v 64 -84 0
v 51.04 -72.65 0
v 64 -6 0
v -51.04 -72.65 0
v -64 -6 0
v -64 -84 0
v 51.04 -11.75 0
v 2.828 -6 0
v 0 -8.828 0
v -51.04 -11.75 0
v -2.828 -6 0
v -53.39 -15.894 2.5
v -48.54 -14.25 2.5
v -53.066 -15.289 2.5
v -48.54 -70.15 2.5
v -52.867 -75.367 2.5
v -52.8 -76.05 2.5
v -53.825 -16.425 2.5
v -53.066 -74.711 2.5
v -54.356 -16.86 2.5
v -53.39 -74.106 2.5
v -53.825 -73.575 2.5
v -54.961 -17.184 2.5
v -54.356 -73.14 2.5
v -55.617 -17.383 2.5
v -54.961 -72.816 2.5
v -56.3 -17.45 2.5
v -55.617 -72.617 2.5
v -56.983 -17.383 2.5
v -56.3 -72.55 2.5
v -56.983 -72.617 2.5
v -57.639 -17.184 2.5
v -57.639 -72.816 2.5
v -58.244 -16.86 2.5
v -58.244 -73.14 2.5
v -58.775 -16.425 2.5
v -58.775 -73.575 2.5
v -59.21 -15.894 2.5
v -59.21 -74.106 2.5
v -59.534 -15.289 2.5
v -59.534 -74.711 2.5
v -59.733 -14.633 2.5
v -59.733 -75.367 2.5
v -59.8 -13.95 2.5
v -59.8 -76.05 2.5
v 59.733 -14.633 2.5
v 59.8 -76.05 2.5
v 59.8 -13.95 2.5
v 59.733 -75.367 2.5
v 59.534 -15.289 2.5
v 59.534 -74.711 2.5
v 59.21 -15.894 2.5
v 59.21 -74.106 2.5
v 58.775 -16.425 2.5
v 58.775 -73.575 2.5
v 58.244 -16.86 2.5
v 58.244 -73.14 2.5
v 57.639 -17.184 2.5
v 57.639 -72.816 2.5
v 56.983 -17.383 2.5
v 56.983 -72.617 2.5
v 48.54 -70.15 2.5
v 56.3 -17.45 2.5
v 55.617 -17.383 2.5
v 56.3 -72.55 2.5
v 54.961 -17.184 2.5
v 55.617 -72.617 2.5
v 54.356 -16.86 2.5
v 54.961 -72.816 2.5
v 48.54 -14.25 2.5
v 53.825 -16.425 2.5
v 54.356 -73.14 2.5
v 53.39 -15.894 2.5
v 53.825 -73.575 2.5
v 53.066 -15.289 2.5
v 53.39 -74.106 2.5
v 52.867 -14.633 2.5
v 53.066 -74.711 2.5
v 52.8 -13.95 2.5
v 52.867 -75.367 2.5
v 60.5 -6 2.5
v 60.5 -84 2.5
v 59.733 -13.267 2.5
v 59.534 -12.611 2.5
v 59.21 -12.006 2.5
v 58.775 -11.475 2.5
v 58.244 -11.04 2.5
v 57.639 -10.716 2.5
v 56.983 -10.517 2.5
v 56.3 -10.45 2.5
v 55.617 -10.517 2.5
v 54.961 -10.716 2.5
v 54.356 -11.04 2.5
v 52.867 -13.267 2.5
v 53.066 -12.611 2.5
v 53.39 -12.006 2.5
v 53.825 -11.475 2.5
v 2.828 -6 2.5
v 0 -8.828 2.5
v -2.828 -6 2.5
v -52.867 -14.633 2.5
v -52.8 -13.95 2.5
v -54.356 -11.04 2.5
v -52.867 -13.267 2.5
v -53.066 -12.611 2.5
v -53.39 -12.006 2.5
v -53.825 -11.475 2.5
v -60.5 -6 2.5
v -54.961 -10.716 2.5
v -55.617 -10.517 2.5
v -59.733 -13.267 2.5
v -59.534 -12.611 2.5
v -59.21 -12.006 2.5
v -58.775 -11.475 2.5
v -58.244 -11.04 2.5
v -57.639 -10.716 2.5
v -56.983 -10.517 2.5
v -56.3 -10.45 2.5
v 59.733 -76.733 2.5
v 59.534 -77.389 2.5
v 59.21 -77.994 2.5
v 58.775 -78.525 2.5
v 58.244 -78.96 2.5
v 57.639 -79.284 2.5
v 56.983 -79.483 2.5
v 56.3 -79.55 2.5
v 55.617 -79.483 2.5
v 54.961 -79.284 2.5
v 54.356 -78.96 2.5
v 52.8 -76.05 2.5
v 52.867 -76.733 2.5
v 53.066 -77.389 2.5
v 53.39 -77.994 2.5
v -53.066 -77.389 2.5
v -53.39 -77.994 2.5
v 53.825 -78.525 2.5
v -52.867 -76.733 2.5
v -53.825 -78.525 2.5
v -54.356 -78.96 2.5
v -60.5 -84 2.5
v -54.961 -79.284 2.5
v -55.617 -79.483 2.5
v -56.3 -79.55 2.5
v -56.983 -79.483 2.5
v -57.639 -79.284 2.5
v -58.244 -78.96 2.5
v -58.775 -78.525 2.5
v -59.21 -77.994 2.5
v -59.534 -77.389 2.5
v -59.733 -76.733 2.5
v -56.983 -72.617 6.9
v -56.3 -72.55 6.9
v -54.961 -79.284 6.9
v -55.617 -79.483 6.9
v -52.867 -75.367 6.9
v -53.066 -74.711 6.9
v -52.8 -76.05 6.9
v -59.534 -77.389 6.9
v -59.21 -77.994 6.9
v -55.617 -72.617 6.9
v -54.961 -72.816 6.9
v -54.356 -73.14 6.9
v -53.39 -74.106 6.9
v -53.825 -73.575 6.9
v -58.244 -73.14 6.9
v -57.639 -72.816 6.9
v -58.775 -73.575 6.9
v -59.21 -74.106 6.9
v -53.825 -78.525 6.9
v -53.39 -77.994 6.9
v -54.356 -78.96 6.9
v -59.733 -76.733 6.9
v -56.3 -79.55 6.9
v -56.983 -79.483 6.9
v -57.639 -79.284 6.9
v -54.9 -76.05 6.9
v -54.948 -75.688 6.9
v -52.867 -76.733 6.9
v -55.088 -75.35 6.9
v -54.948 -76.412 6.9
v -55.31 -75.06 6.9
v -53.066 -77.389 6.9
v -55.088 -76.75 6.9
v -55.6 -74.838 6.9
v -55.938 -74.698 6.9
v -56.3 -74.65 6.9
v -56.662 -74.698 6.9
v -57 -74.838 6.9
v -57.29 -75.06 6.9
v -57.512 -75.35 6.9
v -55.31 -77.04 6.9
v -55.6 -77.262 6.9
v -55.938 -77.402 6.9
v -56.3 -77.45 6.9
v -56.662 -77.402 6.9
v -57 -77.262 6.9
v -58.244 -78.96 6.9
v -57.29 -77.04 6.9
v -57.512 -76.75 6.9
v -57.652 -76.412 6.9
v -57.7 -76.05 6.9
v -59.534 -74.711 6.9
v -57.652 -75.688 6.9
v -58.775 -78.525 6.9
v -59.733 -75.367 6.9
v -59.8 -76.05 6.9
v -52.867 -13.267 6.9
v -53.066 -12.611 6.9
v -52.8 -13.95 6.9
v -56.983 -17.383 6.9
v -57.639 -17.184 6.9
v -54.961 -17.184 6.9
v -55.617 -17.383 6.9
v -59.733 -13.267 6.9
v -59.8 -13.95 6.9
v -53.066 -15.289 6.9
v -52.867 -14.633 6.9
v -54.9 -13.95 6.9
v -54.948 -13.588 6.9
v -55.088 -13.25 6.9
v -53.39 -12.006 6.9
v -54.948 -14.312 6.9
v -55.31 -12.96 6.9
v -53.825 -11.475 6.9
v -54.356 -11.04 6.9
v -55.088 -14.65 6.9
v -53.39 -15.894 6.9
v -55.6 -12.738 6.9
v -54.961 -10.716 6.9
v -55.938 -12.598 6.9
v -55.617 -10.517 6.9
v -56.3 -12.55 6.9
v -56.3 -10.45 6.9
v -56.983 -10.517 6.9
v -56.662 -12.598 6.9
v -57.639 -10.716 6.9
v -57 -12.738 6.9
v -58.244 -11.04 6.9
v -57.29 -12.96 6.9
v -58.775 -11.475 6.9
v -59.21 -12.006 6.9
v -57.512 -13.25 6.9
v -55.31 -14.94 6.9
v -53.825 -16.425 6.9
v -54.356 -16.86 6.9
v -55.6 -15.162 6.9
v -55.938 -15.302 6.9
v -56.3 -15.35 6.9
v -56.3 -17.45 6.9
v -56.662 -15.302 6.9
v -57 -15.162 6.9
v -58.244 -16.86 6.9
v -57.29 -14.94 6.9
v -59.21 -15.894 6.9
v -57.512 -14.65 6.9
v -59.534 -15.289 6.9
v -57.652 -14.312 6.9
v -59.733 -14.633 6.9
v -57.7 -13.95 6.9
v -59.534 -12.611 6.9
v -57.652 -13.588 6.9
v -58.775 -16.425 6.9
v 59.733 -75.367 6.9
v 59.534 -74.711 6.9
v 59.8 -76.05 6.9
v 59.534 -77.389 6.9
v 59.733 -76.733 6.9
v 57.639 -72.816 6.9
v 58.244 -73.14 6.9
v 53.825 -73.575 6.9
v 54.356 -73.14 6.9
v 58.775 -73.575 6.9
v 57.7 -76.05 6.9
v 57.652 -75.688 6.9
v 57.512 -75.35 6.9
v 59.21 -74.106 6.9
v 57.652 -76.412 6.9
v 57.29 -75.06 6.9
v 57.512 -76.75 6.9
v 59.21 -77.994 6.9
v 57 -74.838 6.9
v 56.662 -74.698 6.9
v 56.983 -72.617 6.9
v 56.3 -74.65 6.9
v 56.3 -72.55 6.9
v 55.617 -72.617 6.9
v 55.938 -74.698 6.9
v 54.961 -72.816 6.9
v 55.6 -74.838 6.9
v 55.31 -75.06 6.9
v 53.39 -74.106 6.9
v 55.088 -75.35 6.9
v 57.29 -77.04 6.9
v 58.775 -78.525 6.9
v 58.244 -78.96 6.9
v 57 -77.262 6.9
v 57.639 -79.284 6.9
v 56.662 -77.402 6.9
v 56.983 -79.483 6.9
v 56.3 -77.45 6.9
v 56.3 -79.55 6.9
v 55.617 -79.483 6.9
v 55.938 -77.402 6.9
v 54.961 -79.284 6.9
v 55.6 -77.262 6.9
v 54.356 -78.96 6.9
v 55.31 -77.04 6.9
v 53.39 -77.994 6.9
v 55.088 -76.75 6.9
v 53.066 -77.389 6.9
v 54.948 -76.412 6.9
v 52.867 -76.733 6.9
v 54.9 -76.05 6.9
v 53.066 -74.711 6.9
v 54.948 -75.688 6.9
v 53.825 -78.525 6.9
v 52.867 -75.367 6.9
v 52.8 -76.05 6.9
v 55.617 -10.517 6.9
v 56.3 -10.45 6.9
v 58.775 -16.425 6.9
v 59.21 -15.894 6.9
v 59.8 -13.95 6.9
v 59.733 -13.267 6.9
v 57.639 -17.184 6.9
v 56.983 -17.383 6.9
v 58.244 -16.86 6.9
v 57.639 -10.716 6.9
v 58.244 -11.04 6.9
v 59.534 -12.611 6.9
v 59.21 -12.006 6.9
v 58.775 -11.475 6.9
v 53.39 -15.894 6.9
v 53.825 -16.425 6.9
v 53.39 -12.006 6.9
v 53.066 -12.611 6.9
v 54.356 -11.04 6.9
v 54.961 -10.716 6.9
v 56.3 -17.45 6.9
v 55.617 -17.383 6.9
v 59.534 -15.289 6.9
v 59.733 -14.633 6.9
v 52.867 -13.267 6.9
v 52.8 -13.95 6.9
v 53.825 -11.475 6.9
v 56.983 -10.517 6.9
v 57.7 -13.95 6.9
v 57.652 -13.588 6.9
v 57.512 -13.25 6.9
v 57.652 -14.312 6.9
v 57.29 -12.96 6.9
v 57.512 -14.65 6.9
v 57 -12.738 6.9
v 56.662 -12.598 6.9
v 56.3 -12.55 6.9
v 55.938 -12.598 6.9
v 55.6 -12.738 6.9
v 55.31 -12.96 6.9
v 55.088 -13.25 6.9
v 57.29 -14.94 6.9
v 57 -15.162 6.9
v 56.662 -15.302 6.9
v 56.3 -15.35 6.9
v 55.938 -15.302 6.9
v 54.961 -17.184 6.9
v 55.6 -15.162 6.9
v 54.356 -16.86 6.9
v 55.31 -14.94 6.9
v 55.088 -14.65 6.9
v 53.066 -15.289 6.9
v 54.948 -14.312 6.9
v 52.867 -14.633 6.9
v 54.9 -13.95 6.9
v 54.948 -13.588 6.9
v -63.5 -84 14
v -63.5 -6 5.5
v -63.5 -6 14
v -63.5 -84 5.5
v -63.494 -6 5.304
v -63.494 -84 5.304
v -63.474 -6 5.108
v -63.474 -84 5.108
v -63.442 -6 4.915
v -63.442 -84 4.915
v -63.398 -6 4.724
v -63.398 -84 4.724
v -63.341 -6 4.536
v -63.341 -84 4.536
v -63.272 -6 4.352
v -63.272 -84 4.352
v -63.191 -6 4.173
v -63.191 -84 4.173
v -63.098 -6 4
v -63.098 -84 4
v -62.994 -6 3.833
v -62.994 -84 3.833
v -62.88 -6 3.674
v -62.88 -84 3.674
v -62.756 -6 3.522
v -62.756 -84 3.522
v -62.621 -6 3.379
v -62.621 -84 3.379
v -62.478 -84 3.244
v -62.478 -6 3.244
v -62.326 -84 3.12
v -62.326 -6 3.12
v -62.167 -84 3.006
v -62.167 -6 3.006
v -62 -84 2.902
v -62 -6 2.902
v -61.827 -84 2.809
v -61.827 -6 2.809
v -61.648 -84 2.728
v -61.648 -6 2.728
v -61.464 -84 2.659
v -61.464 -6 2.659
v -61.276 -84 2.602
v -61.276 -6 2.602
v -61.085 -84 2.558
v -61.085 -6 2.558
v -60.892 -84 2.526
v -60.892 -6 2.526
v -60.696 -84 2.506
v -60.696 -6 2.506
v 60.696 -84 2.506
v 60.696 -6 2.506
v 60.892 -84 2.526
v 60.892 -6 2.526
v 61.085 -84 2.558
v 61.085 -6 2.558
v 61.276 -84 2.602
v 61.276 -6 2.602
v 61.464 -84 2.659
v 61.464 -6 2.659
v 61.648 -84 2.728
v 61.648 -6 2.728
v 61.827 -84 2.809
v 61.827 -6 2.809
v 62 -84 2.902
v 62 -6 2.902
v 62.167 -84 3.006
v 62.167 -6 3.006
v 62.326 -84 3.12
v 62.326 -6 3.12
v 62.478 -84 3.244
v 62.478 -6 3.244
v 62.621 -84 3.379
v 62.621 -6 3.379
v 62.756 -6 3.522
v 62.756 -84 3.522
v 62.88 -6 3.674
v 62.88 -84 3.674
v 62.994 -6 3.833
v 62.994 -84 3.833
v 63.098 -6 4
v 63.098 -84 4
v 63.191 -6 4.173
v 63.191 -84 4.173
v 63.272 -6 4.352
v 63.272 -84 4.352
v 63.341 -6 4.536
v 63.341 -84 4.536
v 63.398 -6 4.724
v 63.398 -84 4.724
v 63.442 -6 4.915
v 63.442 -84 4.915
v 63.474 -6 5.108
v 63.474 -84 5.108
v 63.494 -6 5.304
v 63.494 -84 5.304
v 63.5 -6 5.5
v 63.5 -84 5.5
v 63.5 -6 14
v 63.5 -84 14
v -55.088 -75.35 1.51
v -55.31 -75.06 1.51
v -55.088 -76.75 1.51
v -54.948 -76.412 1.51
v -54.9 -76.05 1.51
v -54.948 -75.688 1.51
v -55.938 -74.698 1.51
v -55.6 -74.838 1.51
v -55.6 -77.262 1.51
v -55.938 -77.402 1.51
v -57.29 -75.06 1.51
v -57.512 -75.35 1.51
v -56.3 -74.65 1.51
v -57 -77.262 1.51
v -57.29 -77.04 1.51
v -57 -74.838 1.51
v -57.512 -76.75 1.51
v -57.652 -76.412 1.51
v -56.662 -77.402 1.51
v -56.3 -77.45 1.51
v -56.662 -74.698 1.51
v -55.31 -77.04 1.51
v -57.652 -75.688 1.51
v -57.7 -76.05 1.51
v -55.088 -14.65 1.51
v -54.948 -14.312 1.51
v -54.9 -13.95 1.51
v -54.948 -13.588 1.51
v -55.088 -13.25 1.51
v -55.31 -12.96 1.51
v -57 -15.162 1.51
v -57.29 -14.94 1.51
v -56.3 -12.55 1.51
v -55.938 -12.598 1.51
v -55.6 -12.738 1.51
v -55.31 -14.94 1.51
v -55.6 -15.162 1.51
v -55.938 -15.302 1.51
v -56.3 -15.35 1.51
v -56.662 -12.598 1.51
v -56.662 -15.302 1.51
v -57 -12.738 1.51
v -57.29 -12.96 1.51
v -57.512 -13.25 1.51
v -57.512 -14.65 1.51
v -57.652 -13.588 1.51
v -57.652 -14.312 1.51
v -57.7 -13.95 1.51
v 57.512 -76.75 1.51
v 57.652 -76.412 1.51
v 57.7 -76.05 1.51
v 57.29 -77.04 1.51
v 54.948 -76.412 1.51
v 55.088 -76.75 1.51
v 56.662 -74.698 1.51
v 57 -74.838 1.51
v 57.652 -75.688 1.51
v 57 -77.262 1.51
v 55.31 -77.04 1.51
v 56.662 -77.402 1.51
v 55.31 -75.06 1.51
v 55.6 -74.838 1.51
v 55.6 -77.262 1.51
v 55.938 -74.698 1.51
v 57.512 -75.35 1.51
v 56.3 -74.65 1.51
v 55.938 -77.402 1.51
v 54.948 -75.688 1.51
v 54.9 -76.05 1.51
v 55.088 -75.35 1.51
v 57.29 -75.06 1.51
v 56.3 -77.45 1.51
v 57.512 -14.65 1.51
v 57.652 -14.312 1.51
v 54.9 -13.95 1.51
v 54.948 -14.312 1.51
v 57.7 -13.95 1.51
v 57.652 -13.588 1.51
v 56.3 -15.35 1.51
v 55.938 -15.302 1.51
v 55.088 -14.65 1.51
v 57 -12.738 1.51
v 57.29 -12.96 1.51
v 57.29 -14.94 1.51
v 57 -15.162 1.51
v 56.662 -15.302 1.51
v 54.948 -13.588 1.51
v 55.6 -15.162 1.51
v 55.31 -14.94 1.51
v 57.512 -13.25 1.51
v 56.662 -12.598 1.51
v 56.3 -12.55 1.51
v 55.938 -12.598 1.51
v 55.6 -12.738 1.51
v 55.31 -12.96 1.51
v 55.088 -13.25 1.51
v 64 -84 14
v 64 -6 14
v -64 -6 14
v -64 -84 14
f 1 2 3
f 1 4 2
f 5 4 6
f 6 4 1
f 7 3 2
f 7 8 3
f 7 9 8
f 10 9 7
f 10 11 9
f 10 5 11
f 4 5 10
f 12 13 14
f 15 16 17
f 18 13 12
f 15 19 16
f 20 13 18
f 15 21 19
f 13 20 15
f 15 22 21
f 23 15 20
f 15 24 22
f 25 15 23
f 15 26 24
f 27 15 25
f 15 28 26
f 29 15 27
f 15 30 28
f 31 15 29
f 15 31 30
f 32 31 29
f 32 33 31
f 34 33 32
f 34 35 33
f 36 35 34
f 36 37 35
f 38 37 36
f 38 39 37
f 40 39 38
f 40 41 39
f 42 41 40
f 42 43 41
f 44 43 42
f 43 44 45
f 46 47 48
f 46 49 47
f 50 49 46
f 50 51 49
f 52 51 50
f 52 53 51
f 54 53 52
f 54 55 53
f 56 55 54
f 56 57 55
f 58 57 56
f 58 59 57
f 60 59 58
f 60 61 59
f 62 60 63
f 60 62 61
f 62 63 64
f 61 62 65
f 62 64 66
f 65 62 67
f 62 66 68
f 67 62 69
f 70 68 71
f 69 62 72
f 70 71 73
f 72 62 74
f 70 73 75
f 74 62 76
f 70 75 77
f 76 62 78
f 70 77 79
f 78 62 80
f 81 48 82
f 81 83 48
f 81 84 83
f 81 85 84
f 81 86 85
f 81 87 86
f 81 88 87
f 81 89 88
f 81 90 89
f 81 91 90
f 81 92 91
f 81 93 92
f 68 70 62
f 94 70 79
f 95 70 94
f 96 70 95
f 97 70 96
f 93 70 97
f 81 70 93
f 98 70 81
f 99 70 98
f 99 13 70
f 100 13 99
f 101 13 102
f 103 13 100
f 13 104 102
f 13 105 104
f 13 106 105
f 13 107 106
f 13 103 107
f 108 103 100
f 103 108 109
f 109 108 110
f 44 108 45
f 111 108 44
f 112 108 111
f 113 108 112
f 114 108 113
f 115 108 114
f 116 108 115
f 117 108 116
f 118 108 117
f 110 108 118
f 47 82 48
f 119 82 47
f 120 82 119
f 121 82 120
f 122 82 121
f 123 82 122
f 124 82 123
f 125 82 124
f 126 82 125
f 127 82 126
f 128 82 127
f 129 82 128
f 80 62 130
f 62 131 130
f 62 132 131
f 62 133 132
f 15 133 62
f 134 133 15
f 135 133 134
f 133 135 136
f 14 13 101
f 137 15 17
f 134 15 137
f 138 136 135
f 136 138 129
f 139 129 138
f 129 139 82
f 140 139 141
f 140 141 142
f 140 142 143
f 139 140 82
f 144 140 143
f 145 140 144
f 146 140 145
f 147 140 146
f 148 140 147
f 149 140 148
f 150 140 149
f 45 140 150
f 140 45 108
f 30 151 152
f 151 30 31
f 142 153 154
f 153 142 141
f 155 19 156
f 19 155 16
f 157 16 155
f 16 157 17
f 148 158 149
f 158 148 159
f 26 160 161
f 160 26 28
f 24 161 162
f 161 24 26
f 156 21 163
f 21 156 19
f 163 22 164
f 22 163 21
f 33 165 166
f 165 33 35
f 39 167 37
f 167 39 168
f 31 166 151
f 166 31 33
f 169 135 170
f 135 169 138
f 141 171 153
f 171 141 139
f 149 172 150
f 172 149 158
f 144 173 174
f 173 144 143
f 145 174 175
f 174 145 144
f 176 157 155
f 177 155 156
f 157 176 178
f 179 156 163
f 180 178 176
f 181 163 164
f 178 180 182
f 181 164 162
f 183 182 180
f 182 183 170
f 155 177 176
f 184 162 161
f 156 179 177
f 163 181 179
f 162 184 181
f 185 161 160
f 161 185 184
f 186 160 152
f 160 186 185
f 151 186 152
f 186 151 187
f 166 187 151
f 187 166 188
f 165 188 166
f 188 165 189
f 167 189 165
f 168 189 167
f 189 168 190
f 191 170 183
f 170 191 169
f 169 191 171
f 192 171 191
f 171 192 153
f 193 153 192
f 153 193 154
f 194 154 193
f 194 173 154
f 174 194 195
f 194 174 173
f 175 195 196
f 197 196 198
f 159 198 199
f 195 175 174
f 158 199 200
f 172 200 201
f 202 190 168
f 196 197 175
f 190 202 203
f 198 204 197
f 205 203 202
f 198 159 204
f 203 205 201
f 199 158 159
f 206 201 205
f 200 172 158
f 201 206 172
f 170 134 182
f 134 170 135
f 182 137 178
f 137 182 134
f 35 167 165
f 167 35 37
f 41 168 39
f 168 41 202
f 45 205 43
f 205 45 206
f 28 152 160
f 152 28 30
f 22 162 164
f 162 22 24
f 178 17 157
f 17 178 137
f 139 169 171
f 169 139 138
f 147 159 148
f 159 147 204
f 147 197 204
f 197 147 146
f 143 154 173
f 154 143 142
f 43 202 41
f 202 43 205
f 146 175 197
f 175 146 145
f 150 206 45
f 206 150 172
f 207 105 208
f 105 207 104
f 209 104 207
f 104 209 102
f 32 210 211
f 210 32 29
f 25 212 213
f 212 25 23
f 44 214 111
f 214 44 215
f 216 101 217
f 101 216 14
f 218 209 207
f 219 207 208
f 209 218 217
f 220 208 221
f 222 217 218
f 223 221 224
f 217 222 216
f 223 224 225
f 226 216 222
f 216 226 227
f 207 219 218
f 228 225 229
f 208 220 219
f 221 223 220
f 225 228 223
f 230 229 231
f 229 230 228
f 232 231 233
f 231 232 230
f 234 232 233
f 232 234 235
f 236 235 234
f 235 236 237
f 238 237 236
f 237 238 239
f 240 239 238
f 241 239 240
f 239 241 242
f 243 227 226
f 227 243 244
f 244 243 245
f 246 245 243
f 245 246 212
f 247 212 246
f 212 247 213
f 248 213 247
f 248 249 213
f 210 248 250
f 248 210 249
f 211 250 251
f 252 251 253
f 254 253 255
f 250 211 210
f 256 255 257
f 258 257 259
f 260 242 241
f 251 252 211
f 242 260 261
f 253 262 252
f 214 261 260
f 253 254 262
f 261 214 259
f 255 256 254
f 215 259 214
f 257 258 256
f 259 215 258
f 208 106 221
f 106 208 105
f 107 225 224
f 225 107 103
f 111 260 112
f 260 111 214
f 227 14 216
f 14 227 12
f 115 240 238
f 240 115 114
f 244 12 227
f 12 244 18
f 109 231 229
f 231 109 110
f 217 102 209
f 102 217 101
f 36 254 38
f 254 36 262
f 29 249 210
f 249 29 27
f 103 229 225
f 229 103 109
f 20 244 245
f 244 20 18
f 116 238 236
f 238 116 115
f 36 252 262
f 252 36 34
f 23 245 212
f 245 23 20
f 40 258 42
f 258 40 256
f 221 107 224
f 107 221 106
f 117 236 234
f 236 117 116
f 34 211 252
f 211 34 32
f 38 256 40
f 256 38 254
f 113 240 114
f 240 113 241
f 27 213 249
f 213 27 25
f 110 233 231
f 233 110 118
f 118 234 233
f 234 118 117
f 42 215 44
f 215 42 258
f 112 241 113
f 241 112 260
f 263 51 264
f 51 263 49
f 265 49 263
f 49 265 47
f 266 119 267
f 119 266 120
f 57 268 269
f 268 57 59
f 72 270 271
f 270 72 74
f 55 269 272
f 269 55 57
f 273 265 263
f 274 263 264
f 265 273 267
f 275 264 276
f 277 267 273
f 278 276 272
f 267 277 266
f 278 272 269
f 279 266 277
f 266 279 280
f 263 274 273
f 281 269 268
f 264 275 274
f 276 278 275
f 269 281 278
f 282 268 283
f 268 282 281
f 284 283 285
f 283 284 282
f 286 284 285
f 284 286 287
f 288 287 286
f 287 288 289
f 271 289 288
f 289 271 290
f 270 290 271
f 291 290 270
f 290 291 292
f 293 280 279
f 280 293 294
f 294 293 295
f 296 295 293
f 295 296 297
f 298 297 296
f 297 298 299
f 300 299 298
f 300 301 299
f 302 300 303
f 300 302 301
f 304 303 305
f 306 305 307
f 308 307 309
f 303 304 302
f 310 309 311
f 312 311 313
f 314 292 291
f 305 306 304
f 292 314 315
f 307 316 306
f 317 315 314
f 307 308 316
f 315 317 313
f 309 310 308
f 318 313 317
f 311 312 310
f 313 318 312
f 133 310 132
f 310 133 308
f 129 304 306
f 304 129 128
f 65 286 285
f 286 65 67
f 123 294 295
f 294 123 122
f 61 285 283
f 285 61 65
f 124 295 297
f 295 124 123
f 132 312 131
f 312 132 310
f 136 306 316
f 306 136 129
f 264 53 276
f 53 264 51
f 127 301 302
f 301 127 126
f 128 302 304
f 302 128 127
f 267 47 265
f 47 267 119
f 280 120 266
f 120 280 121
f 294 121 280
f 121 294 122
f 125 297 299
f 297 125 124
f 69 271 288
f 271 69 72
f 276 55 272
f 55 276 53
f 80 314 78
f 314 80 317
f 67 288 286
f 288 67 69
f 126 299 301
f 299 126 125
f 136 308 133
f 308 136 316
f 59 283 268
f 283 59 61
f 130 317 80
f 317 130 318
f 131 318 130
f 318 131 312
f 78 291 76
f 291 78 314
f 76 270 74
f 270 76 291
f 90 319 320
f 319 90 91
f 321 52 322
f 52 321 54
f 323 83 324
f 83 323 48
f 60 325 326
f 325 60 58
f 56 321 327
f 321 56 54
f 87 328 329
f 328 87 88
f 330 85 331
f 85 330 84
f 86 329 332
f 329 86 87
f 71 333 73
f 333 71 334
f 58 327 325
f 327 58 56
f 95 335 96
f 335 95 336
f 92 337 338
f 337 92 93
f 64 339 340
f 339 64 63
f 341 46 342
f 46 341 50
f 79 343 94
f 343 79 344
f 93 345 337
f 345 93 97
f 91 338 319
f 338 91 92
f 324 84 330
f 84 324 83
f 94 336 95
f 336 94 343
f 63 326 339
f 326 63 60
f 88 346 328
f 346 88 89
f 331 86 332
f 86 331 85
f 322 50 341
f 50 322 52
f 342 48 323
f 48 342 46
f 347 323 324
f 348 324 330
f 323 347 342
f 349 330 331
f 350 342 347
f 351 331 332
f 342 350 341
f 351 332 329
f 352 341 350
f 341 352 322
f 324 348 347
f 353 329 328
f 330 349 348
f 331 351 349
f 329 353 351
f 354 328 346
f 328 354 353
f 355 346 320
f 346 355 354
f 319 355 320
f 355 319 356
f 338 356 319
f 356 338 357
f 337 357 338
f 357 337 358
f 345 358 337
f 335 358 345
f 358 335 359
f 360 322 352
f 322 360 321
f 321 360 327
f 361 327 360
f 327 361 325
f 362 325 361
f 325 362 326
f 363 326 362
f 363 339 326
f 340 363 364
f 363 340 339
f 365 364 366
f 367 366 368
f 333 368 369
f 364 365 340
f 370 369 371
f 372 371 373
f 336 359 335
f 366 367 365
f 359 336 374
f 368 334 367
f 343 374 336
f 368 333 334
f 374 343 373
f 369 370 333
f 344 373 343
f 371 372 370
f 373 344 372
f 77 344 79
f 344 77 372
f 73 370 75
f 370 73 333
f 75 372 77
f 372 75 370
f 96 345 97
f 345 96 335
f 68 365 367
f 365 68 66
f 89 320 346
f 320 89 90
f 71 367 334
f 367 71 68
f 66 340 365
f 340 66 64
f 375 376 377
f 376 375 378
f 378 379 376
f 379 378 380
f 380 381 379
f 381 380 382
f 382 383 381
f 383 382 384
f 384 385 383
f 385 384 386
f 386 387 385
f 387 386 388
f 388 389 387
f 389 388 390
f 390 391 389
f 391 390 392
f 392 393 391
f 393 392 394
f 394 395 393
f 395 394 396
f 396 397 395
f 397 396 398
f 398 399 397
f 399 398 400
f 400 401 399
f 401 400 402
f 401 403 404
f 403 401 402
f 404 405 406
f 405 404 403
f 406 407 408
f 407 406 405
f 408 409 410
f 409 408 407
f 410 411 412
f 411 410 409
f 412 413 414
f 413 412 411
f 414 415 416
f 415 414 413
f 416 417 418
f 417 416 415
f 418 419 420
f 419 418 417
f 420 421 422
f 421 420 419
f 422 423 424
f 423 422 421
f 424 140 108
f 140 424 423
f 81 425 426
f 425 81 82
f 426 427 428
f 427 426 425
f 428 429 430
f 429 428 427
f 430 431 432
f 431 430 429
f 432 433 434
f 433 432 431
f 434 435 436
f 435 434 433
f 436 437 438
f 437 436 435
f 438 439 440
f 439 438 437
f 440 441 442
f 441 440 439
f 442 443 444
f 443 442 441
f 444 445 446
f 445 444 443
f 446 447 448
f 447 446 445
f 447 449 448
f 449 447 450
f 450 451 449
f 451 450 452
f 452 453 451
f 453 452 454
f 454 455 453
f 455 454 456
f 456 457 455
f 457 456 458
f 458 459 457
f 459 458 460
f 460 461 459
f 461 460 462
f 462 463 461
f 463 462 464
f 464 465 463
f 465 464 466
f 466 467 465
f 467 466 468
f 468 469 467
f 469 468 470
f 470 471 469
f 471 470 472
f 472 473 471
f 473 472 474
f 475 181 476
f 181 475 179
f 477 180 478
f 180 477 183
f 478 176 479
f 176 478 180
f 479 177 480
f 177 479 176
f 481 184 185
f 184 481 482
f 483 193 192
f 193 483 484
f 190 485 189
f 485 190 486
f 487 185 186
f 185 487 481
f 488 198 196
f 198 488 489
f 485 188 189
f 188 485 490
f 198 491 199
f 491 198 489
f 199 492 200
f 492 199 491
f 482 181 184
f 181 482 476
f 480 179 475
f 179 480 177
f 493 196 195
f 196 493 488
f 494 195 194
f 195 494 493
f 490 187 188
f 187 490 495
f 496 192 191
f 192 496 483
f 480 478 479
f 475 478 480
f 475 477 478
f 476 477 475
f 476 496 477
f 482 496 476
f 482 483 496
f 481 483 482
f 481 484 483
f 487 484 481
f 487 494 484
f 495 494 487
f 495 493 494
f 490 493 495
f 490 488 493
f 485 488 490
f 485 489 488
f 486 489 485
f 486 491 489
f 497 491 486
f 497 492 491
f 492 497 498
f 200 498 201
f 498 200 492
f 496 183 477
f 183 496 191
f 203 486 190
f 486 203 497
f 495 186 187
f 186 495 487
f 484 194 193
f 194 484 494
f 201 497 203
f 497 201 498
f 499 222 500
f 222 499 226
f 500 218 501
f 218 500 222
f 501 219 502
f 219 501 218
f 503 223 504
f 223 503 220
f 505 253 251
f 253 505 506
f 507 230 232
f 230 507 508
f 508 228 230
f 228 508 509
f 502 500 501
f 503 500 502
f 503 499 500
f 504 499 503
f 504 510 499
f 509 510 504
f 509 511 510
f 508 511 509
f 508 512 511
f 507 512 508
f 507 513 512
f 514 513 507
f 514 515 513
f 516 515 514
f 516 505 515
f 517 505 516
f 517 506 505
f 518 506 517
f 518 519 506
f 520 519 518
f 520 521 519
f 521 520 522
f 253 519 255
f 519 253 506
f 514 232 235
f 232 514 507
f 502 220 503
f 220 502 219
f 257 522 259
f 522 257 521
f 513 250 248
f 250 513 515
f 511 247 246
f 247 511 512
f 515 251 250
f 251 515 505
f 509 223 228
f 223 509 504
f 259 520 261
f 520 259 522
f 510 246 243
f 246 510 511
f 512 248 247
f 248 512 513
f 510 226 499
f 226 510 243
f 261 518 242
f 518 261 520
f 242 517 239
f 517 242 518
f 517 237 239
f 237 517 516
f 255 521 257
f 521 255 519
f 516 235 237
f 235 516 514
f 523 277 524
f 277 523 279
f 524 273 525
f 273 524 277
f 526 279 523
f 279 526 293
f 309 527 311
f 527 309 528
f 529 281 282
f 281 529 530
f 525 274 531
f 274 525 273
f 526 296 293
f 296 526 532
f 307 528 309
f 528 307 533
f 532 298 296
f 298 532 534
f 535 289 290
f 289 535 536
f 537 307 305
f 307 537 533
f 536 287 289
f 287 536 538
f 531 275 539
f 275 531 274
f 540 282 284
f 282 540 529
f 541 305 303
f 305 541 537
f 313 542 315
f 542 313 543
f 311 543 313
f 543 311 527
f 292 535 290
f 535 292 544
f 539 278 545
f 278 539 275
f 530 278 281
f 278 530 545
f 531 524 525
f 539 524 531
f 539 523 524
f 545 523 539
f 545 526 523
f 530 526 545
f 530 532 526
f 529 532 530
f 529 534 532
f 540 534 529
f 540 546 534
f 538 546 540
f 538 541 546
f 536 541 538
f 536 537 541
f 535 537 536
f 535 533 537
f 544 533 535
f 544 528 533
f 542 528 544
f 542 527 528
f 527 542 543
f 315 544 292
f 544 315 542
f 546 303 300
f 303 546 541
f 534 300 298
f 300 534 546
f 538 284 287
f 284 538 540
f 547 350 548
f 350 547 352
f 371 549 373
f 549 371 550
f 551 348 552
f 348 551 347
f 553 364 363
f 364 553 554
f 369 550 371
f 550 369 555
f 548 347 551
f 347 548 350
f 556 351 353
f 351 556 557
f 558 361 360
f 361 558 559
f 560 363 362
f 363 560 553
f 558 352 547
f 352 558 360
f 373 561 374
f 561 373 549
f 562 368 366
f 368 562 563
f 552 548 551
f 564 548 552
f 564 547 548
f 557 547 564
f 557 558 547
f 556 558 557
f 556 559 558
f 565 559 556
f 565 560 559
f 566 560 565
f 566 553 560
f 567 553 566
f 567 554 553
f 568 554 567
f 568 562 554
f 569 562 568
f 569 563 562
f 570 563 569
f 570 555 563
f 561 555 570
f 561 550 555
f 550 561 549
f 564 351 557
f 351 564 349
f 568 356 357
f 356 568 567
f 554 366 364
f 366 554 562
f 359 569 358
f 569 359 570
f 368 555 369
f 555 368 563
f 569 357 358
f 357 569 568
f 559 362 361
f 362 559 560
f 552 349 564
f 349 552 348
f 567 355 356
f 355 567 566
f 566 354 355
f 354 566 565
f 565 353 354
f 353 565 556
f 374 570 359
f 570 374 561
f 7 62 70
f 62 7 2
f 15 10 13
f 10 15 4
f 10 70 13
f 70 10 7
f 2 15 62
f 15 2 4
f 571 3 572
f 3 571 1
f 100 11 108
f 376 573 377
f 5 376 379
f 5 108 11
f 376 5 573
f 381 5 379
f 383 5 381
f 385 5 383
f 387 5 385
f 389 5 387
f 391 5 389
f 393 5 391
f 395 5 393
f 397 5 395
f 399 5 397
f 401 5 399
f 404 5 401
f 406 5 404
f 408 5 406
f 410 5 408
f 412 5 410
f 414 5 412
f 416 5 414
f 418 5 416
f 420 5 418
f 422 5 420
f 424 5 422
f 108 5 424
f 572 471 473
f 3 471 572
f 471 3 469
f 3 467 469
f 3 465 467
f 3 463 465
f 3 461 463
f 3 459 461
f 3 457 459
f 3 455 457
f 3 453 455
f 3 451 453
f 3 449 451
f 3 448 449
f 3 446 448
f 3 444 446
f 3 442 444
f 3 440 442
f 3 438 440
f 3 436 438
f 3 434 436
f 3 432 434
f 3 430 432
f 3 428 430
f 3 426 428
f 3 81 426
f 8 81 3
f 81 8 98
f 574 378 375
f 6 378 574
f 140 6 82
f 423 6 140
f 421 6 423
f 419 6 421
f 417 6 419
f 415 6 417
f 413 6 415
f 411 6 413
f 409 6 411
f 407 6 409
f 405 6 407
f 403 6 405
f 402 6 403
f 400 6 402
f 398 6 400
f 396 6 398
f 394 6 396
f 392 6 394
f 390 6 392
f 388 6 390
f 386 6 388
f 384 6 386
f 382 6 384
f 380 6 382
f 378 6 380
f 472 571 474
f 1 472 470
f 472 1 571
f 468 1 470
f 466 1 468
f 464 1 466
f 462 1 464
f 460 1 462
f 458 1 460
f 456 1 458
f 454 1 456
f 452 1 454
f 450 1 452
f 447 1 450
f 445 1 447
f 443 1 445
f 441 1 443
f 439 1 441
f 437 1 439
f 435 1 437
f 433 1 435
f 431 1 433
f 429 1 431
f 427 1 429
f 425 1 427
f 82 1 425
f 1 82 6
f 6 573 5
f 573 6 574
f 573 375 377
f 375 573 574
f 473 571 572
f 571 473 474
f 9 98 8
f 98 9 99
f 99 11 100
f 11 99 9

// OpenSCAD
// file: ../../level2.scad
// Level 2 - shared dimensions for the drive deck, motor bracket, body and skirt.
// Frame: origin at the centre of the deck's TOP surface; +Z up, +Y = front (display), +X = right.
// The lazy Susan sits on the deck's plinth; the turntable pulley hangs through the deck's hole.
include <params.scad>

// ---- outline -------------------------------------------------------------------------------
l2_size   = [160, 160];     // footprint (rounded square), same for body and skirt
l2_r      = 14;             // corner radius
l2_h      = 90;             // body height (floor to the deck's underside... see body)
l2_wall   = 2.5;            // body walls

// ---- the reComputer under Level 2, and the skirt round it (skirt.scad) -------------------------
jetson    = [130.1, 121.1, 51];     // reComputer J4012, MEASURED (x, y, height) with its case top OFF;
                                    //   ports at the back, fan near the middle (~1 cm toward the front)
jetson_top = 7.1;                   // the case top, if fitted: 58.1 with it, MEASURED
air_gap   = 10;                     // over the case top when it's on (17 over the open board): the fan
                                    //   draws in from here
skirt_h   = jetson[2] + jetson_top + air_gap;   // 68.1: desk -> Level 2's floor
// body <-> skirt screws (M3 down through the body floor into inserts in the skirt): along the
// sides, outside the reComputer (x +/-65)
skirt_pts = [[-71, -45], [-71, 45], [71, -45], [71, 5]];   // clear of the buck (left),
                                    //   the perfboard (right front) and the motor (right back)

// ---- deck ----------------------------------------------------------------------------------
deck_t    = 4;              // deck plate: z = -deck_t .. 0
deck_hole = 112;            // reach the inner ring's bolts from below during assembly

// ---- lazy Susan + turntable pulley (turntable_pulley.scad) --------------------------------
z_ls      = plinth_h;                    // lazy Susan's underside (on the plinth): 2
z_plate   = z_ls + ls_h;                 // turntable plate's underside = inner ring top: 12.5
belt_drop = 24.5;                        // plate underside -> belt centre (turntable_pulley)
z_belt    = z_plate - belt_drop;         // -12: belt centre, below the deck top
pulley_R  = 100 * 2 / PI / 2;            // 31.83: ring pulley pitch radius (100 T)
pulley_bottom = z_belt - 3.2 - 1.6 - 2.2;  // -19: lowest point of the hanging pulley
clamp_r   = 35.5;                        // pulley's belt clamp block (its widest part)

// ---- motor ----------------------------------------------------------------------------------
motor_a   = -45;            // direction of the motor from the centre: back-right corner
motor_C   = 46;             // nominal centre distance; the bracket slides +/- tension_travel (42..50:
                            //   at 41 the motor pulley would touch the ring pulley's flange)
tension_travel = 4;
nema      = [42.3, 33.4];   // NEMA17 (MEASURED body length; not a pancake): square, body length
nema_shaft = 17.5;          // MEASURED shaft length above the face
nema_holes = 31;            // M3 screw spacing on its face
nema_boss = 22;             // centring boss on its face (dia), ~2 tall
mp_T      = 20;             // motor pulley teeth
mp_belt_c = 13 + 7.1 / 2;   // MEASURED: pulley pushed fully down on the motor, its toothed section
                            //   (7.1 wide; the belt is a standard 6 mm) runs 13..20.1 above the face
bracket_t = 3;              // motor plate thickness; the pulley passes down through its centre hole
bracket_drop = 3;           // the motor hangs this much LOWER than "pulley pushed fully down" needs:
                            //   on the first build the ring pulley sat ~2 mm below the motor pulley,
                            //   so the motor pulley now starts ~1 mm low and is raised on the shaft
                            //   to line the belt up (a few mm of adjustment either way)
z_motor_face  = z_belt - mp_belt_c - bracket_drop;   // -31.55
z_bracket_top = z_motor_face + bracket_t;    // -28.55
z_motor_bottom = z_motor_face - nema[1];     // -64.95
z_mp_top  = z_motor_face + bracket_drop + 13 + 7.1 + 1;   // ~-7.45 (pulley raised to the belt; EST top flange ~1 mm)
// main file
// Display fit test: just the front wall of the Level 2 body round the 4.3" display - the window
// (raised 2.8 mm above the board's centre, chamfered) and the four posts with M3 inserts - cut
// straight from l2_body.scad, so it is exactly what the body will have. (~30 min)
// The notch marks the TOP edge. Check: screw the JC4827W543 on (image upright) (M3 x 6-8 into heat-set inserts); the image should fill the
// window evenly with only black border showing, and the glass should sit flat on the wall.
// PRINT as modelled: face down on the bed, posts up, no supports.
use <../archive/l2_body.scad>
include <../../level2.scad>

disp_zc = -l2_h / 2;                           // must match l2_body.scad
half    = l2_size[0] / 2;

translate([0, 0, half]) rotate([-90, 0, 0])    // wall's outside face -> the bed, posts up
    difference() {
        intersection() {
            l2_body();
            translate([-64, half - 14, disp_zc - 39]) cube([128, 14.2, 78]);
        }
        // notch in the middle of the TOP edge (the window is offset toward it)
        translate([0, half - 7, disp_zc + 39]) rotate([0, 45, 0]) cube([4, 20, 4], center = true);
    }
